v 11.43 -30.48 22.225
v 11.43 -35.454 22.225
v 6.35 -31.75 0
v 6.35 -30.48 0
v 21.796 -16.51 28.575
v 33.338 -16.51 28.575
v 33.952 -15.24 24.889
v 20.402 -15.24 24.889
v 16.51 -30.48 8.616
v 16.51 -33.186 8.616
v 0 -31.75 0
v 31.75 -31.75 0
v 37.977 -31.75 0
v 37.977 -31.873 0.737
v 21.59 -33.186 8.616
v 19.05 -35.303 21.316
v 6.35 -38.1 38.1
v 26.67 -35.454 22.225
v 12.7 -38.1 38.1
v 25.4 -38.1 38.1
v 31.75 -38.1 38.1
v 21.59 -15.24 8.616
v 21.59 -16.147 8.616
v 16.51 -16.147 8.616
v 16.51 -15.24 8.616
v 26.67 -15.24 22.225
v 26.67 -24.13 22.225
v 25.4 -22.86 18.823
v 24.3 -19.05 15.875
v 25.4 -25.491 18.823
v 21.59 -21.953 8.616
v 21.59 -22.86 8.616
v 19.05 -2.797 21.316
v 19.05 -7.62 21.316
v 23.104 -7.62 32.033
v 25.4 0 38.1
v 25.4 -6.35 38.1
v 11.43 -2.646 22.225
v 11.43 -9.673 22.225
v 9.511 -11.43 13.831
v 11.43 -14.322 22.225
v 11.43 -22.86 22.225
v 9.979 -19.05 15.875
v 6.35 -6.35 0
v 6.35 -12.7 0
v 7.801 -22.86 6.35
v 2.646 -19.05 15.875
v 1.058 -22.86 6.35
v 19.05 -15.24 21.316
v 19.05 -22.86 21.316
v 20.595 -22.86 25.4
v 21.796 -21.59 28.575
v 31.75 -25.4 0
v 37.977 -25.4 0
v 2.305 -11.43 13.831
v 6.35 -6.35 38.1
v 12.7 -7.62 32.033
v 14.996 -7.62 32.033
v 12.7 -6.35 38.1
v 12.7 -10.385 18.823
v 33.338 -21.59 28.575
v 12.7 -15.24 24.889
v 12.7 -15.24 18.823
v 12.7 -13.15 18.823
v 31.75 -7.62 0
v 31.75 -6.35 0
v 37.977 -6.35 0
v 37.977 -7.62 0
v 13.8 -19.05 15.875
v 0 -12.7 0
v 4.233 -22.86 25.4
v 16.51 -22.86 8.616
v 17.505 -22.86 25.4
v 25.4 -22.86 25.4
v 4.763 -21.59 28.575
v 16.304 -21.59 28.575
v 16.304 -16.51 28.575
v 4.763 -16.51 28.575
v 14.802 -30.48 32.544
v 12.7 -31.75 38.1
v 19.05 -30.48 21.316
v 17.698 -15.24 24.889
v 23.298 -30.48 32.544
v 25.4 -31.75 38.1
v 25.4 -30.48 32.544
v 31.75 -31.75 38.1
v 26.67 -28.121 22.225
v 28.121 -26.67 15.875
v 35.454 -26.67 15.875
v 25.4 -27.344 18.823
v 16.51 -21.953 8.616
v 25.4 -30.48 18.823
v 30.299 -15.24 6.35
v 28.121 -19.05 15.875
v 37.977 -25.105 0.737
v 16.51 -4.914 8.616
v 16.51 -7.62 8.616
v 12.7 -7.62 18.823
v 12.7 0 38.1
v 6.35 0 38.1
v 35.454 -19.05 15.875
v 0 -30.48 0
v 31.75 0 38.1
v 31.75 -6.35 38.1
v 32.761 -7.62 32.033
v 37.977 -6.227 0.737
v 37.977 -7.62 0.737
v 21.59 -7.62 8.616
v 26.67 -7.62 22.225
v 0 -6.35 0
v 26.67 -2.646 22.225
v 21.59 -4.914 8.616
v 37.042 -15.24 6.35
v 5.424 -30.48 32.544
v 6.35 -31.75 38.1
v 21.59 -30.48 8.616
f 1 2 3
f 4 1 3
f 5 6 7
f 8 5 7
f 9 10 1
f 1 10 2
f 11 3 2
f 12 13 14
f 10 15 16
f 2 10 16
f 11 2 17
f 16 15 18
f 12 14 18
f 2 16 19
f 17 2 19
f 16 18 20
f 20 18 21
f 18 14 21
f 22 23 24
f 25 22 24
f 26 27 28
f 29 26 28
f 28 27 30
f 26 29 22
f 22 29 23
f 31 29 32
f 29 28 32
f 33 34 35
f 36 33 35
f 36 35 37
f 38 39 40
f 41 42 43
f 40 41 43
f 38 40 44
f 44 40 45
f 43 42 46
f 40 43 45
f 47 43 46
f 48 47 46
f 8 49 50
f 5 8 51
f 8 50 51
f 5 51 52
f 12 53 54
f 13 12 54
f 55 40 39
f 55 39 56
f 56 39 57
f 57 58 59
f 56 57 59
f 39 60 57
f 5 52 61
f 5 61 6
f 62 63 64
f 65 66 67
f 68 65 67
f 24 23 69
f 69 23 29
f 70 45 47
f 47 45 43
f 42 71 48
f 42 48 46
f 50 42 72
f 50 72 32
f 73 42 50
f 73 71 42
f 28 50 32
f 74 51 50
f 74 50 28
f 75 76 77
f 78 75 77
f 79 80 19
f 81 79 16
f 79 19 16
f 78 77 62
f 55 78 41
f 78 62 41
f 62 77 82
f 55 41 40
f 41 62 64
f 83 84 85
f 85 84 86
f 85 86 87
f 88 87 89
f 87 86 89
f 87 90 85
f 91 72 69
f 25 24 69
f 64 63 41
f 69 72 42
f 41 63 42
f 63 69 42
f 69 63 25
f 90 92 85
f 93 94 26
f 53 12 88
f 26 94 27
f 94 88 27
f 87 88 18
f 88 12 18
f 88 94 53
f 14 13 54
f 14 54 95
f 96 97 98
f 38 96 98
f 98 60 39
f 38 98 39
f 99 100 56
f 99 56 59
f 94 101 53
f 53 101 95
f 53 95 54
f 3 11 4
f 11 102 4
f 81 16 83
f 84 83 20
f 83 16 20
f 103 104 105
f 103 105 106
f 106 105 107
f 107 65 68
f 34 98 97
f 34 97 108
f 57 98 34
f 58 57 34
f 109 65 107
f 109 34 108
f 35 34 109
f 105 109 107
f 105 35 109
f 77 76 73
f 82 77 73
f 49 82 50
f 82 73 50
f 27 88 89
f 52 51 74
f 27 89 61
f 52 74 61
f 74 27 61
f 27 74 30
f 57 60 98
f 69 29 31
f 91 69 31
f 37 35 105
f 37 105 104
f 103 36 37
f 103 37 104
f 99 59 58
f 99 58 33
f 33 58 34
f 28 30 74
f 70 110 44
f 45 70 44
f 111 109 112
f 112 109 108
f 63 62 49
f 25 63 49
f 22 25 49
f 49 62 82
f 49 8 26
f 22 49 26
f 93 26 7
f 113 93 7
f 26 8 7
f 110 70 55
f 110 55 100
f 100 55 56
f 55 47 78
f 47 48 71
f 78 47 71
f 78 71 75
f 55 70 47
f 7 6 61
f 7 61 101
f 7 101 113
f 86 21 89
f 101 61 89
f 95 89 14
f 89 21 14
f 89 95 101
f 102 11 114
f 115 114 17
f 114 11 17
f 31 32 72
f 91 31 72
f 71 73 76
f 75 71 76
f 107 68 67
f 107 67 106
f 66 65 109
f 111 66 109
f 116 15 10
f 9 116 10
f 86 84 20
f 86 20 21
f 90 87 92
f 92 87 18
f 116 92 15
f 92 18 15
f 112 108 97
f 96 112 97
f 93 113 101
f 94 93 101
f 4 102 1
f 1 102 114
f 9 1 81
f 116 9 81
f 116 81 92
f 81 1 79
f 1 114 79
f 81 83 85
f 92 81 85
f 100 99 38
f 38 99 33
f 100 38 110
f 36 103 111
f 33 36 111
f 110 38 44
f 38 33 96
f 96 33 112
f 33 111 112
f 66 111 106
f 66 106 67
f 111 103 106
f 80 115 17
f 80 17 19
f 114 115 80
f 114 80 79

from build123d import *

# Parameters (mm, degrees)
F0_W      = 37.977102
F0_H      = 38.1
F1_DEPTH  = 38.1
F6_DEPTH  = 38.1
F8_DEPTH  = 38.1
F9_W      = 25.4
F9_H      = 7.62
F10_DEPTH = 38.1


with BuildPart() as f1:
    # F0 (on Front) → F1 (new body)
    with BuildSketch(Plane.XZ):
        with Locations((18.988551, 19.05)):
            Rectangle(F0_W, F0_H)
    extrude(amount=F1_DEPTH)

    # F5 (on offset) → F6 (cut)
    with BuildSketch(Plane.YZ.offset(38.1)):
        Polygon((-31.75, 0), (-38.1, 38.1), (-38.1, 0), align=None)
        Polygon((-11.43, 13.831229), (-6.35, 38.1), (-31.75, 38.1), (-26.67, 15.875), (-21.59, 28.575), (-16.51, 28.575), align=None)
        Polygon((-19.05, 0), (-12.7, 0), (-19.05, 15.875), (-25.4, 0), align=None)
        Polygon((0, 0), (0, 38.1), (-6.35, 0), align=None)
    extrude(amount=-F6_DEPTH, mode=Mode.SUBTRACT)

    # F7 (on offset) → F8 (cut)
    with BuildSketch(Plane.XZ.offset(38.1)):
        Polygon((11.43, 22.225), (6.35, 0), (31.75, 0), (26.67, 22.225), (21.59, 8.616461), (16.51, 8.616461), align=None)
        Polygon((25.4, 38.1), (12.7, 38.1), (19.05, 21.316461), align=None)
        Polygon((0, 38.1), (0, 0), (6.35, 38.1), align=None)
        Polygon((31.75, 38.1), (38.1, 0), (38.1, 38.1), align=None)
    extrude(amount=-F8_DEPTH, mode=Mode.SUBTRACT)

    # F9 (on offset) → F10 (cut)
    with BuildSketch(Plane.XY.offset(38.1)):
        with Locations((25.4, -11.43)):
            Rectangle(F9_W, F9_H)
        with Locations((12.7, -26.67)):
            Rectangle(F9_W, F9_H)
    extrude(amount=-F10_DEPTH, mode=Mode.SUBTRACT)


solid = f1.part
